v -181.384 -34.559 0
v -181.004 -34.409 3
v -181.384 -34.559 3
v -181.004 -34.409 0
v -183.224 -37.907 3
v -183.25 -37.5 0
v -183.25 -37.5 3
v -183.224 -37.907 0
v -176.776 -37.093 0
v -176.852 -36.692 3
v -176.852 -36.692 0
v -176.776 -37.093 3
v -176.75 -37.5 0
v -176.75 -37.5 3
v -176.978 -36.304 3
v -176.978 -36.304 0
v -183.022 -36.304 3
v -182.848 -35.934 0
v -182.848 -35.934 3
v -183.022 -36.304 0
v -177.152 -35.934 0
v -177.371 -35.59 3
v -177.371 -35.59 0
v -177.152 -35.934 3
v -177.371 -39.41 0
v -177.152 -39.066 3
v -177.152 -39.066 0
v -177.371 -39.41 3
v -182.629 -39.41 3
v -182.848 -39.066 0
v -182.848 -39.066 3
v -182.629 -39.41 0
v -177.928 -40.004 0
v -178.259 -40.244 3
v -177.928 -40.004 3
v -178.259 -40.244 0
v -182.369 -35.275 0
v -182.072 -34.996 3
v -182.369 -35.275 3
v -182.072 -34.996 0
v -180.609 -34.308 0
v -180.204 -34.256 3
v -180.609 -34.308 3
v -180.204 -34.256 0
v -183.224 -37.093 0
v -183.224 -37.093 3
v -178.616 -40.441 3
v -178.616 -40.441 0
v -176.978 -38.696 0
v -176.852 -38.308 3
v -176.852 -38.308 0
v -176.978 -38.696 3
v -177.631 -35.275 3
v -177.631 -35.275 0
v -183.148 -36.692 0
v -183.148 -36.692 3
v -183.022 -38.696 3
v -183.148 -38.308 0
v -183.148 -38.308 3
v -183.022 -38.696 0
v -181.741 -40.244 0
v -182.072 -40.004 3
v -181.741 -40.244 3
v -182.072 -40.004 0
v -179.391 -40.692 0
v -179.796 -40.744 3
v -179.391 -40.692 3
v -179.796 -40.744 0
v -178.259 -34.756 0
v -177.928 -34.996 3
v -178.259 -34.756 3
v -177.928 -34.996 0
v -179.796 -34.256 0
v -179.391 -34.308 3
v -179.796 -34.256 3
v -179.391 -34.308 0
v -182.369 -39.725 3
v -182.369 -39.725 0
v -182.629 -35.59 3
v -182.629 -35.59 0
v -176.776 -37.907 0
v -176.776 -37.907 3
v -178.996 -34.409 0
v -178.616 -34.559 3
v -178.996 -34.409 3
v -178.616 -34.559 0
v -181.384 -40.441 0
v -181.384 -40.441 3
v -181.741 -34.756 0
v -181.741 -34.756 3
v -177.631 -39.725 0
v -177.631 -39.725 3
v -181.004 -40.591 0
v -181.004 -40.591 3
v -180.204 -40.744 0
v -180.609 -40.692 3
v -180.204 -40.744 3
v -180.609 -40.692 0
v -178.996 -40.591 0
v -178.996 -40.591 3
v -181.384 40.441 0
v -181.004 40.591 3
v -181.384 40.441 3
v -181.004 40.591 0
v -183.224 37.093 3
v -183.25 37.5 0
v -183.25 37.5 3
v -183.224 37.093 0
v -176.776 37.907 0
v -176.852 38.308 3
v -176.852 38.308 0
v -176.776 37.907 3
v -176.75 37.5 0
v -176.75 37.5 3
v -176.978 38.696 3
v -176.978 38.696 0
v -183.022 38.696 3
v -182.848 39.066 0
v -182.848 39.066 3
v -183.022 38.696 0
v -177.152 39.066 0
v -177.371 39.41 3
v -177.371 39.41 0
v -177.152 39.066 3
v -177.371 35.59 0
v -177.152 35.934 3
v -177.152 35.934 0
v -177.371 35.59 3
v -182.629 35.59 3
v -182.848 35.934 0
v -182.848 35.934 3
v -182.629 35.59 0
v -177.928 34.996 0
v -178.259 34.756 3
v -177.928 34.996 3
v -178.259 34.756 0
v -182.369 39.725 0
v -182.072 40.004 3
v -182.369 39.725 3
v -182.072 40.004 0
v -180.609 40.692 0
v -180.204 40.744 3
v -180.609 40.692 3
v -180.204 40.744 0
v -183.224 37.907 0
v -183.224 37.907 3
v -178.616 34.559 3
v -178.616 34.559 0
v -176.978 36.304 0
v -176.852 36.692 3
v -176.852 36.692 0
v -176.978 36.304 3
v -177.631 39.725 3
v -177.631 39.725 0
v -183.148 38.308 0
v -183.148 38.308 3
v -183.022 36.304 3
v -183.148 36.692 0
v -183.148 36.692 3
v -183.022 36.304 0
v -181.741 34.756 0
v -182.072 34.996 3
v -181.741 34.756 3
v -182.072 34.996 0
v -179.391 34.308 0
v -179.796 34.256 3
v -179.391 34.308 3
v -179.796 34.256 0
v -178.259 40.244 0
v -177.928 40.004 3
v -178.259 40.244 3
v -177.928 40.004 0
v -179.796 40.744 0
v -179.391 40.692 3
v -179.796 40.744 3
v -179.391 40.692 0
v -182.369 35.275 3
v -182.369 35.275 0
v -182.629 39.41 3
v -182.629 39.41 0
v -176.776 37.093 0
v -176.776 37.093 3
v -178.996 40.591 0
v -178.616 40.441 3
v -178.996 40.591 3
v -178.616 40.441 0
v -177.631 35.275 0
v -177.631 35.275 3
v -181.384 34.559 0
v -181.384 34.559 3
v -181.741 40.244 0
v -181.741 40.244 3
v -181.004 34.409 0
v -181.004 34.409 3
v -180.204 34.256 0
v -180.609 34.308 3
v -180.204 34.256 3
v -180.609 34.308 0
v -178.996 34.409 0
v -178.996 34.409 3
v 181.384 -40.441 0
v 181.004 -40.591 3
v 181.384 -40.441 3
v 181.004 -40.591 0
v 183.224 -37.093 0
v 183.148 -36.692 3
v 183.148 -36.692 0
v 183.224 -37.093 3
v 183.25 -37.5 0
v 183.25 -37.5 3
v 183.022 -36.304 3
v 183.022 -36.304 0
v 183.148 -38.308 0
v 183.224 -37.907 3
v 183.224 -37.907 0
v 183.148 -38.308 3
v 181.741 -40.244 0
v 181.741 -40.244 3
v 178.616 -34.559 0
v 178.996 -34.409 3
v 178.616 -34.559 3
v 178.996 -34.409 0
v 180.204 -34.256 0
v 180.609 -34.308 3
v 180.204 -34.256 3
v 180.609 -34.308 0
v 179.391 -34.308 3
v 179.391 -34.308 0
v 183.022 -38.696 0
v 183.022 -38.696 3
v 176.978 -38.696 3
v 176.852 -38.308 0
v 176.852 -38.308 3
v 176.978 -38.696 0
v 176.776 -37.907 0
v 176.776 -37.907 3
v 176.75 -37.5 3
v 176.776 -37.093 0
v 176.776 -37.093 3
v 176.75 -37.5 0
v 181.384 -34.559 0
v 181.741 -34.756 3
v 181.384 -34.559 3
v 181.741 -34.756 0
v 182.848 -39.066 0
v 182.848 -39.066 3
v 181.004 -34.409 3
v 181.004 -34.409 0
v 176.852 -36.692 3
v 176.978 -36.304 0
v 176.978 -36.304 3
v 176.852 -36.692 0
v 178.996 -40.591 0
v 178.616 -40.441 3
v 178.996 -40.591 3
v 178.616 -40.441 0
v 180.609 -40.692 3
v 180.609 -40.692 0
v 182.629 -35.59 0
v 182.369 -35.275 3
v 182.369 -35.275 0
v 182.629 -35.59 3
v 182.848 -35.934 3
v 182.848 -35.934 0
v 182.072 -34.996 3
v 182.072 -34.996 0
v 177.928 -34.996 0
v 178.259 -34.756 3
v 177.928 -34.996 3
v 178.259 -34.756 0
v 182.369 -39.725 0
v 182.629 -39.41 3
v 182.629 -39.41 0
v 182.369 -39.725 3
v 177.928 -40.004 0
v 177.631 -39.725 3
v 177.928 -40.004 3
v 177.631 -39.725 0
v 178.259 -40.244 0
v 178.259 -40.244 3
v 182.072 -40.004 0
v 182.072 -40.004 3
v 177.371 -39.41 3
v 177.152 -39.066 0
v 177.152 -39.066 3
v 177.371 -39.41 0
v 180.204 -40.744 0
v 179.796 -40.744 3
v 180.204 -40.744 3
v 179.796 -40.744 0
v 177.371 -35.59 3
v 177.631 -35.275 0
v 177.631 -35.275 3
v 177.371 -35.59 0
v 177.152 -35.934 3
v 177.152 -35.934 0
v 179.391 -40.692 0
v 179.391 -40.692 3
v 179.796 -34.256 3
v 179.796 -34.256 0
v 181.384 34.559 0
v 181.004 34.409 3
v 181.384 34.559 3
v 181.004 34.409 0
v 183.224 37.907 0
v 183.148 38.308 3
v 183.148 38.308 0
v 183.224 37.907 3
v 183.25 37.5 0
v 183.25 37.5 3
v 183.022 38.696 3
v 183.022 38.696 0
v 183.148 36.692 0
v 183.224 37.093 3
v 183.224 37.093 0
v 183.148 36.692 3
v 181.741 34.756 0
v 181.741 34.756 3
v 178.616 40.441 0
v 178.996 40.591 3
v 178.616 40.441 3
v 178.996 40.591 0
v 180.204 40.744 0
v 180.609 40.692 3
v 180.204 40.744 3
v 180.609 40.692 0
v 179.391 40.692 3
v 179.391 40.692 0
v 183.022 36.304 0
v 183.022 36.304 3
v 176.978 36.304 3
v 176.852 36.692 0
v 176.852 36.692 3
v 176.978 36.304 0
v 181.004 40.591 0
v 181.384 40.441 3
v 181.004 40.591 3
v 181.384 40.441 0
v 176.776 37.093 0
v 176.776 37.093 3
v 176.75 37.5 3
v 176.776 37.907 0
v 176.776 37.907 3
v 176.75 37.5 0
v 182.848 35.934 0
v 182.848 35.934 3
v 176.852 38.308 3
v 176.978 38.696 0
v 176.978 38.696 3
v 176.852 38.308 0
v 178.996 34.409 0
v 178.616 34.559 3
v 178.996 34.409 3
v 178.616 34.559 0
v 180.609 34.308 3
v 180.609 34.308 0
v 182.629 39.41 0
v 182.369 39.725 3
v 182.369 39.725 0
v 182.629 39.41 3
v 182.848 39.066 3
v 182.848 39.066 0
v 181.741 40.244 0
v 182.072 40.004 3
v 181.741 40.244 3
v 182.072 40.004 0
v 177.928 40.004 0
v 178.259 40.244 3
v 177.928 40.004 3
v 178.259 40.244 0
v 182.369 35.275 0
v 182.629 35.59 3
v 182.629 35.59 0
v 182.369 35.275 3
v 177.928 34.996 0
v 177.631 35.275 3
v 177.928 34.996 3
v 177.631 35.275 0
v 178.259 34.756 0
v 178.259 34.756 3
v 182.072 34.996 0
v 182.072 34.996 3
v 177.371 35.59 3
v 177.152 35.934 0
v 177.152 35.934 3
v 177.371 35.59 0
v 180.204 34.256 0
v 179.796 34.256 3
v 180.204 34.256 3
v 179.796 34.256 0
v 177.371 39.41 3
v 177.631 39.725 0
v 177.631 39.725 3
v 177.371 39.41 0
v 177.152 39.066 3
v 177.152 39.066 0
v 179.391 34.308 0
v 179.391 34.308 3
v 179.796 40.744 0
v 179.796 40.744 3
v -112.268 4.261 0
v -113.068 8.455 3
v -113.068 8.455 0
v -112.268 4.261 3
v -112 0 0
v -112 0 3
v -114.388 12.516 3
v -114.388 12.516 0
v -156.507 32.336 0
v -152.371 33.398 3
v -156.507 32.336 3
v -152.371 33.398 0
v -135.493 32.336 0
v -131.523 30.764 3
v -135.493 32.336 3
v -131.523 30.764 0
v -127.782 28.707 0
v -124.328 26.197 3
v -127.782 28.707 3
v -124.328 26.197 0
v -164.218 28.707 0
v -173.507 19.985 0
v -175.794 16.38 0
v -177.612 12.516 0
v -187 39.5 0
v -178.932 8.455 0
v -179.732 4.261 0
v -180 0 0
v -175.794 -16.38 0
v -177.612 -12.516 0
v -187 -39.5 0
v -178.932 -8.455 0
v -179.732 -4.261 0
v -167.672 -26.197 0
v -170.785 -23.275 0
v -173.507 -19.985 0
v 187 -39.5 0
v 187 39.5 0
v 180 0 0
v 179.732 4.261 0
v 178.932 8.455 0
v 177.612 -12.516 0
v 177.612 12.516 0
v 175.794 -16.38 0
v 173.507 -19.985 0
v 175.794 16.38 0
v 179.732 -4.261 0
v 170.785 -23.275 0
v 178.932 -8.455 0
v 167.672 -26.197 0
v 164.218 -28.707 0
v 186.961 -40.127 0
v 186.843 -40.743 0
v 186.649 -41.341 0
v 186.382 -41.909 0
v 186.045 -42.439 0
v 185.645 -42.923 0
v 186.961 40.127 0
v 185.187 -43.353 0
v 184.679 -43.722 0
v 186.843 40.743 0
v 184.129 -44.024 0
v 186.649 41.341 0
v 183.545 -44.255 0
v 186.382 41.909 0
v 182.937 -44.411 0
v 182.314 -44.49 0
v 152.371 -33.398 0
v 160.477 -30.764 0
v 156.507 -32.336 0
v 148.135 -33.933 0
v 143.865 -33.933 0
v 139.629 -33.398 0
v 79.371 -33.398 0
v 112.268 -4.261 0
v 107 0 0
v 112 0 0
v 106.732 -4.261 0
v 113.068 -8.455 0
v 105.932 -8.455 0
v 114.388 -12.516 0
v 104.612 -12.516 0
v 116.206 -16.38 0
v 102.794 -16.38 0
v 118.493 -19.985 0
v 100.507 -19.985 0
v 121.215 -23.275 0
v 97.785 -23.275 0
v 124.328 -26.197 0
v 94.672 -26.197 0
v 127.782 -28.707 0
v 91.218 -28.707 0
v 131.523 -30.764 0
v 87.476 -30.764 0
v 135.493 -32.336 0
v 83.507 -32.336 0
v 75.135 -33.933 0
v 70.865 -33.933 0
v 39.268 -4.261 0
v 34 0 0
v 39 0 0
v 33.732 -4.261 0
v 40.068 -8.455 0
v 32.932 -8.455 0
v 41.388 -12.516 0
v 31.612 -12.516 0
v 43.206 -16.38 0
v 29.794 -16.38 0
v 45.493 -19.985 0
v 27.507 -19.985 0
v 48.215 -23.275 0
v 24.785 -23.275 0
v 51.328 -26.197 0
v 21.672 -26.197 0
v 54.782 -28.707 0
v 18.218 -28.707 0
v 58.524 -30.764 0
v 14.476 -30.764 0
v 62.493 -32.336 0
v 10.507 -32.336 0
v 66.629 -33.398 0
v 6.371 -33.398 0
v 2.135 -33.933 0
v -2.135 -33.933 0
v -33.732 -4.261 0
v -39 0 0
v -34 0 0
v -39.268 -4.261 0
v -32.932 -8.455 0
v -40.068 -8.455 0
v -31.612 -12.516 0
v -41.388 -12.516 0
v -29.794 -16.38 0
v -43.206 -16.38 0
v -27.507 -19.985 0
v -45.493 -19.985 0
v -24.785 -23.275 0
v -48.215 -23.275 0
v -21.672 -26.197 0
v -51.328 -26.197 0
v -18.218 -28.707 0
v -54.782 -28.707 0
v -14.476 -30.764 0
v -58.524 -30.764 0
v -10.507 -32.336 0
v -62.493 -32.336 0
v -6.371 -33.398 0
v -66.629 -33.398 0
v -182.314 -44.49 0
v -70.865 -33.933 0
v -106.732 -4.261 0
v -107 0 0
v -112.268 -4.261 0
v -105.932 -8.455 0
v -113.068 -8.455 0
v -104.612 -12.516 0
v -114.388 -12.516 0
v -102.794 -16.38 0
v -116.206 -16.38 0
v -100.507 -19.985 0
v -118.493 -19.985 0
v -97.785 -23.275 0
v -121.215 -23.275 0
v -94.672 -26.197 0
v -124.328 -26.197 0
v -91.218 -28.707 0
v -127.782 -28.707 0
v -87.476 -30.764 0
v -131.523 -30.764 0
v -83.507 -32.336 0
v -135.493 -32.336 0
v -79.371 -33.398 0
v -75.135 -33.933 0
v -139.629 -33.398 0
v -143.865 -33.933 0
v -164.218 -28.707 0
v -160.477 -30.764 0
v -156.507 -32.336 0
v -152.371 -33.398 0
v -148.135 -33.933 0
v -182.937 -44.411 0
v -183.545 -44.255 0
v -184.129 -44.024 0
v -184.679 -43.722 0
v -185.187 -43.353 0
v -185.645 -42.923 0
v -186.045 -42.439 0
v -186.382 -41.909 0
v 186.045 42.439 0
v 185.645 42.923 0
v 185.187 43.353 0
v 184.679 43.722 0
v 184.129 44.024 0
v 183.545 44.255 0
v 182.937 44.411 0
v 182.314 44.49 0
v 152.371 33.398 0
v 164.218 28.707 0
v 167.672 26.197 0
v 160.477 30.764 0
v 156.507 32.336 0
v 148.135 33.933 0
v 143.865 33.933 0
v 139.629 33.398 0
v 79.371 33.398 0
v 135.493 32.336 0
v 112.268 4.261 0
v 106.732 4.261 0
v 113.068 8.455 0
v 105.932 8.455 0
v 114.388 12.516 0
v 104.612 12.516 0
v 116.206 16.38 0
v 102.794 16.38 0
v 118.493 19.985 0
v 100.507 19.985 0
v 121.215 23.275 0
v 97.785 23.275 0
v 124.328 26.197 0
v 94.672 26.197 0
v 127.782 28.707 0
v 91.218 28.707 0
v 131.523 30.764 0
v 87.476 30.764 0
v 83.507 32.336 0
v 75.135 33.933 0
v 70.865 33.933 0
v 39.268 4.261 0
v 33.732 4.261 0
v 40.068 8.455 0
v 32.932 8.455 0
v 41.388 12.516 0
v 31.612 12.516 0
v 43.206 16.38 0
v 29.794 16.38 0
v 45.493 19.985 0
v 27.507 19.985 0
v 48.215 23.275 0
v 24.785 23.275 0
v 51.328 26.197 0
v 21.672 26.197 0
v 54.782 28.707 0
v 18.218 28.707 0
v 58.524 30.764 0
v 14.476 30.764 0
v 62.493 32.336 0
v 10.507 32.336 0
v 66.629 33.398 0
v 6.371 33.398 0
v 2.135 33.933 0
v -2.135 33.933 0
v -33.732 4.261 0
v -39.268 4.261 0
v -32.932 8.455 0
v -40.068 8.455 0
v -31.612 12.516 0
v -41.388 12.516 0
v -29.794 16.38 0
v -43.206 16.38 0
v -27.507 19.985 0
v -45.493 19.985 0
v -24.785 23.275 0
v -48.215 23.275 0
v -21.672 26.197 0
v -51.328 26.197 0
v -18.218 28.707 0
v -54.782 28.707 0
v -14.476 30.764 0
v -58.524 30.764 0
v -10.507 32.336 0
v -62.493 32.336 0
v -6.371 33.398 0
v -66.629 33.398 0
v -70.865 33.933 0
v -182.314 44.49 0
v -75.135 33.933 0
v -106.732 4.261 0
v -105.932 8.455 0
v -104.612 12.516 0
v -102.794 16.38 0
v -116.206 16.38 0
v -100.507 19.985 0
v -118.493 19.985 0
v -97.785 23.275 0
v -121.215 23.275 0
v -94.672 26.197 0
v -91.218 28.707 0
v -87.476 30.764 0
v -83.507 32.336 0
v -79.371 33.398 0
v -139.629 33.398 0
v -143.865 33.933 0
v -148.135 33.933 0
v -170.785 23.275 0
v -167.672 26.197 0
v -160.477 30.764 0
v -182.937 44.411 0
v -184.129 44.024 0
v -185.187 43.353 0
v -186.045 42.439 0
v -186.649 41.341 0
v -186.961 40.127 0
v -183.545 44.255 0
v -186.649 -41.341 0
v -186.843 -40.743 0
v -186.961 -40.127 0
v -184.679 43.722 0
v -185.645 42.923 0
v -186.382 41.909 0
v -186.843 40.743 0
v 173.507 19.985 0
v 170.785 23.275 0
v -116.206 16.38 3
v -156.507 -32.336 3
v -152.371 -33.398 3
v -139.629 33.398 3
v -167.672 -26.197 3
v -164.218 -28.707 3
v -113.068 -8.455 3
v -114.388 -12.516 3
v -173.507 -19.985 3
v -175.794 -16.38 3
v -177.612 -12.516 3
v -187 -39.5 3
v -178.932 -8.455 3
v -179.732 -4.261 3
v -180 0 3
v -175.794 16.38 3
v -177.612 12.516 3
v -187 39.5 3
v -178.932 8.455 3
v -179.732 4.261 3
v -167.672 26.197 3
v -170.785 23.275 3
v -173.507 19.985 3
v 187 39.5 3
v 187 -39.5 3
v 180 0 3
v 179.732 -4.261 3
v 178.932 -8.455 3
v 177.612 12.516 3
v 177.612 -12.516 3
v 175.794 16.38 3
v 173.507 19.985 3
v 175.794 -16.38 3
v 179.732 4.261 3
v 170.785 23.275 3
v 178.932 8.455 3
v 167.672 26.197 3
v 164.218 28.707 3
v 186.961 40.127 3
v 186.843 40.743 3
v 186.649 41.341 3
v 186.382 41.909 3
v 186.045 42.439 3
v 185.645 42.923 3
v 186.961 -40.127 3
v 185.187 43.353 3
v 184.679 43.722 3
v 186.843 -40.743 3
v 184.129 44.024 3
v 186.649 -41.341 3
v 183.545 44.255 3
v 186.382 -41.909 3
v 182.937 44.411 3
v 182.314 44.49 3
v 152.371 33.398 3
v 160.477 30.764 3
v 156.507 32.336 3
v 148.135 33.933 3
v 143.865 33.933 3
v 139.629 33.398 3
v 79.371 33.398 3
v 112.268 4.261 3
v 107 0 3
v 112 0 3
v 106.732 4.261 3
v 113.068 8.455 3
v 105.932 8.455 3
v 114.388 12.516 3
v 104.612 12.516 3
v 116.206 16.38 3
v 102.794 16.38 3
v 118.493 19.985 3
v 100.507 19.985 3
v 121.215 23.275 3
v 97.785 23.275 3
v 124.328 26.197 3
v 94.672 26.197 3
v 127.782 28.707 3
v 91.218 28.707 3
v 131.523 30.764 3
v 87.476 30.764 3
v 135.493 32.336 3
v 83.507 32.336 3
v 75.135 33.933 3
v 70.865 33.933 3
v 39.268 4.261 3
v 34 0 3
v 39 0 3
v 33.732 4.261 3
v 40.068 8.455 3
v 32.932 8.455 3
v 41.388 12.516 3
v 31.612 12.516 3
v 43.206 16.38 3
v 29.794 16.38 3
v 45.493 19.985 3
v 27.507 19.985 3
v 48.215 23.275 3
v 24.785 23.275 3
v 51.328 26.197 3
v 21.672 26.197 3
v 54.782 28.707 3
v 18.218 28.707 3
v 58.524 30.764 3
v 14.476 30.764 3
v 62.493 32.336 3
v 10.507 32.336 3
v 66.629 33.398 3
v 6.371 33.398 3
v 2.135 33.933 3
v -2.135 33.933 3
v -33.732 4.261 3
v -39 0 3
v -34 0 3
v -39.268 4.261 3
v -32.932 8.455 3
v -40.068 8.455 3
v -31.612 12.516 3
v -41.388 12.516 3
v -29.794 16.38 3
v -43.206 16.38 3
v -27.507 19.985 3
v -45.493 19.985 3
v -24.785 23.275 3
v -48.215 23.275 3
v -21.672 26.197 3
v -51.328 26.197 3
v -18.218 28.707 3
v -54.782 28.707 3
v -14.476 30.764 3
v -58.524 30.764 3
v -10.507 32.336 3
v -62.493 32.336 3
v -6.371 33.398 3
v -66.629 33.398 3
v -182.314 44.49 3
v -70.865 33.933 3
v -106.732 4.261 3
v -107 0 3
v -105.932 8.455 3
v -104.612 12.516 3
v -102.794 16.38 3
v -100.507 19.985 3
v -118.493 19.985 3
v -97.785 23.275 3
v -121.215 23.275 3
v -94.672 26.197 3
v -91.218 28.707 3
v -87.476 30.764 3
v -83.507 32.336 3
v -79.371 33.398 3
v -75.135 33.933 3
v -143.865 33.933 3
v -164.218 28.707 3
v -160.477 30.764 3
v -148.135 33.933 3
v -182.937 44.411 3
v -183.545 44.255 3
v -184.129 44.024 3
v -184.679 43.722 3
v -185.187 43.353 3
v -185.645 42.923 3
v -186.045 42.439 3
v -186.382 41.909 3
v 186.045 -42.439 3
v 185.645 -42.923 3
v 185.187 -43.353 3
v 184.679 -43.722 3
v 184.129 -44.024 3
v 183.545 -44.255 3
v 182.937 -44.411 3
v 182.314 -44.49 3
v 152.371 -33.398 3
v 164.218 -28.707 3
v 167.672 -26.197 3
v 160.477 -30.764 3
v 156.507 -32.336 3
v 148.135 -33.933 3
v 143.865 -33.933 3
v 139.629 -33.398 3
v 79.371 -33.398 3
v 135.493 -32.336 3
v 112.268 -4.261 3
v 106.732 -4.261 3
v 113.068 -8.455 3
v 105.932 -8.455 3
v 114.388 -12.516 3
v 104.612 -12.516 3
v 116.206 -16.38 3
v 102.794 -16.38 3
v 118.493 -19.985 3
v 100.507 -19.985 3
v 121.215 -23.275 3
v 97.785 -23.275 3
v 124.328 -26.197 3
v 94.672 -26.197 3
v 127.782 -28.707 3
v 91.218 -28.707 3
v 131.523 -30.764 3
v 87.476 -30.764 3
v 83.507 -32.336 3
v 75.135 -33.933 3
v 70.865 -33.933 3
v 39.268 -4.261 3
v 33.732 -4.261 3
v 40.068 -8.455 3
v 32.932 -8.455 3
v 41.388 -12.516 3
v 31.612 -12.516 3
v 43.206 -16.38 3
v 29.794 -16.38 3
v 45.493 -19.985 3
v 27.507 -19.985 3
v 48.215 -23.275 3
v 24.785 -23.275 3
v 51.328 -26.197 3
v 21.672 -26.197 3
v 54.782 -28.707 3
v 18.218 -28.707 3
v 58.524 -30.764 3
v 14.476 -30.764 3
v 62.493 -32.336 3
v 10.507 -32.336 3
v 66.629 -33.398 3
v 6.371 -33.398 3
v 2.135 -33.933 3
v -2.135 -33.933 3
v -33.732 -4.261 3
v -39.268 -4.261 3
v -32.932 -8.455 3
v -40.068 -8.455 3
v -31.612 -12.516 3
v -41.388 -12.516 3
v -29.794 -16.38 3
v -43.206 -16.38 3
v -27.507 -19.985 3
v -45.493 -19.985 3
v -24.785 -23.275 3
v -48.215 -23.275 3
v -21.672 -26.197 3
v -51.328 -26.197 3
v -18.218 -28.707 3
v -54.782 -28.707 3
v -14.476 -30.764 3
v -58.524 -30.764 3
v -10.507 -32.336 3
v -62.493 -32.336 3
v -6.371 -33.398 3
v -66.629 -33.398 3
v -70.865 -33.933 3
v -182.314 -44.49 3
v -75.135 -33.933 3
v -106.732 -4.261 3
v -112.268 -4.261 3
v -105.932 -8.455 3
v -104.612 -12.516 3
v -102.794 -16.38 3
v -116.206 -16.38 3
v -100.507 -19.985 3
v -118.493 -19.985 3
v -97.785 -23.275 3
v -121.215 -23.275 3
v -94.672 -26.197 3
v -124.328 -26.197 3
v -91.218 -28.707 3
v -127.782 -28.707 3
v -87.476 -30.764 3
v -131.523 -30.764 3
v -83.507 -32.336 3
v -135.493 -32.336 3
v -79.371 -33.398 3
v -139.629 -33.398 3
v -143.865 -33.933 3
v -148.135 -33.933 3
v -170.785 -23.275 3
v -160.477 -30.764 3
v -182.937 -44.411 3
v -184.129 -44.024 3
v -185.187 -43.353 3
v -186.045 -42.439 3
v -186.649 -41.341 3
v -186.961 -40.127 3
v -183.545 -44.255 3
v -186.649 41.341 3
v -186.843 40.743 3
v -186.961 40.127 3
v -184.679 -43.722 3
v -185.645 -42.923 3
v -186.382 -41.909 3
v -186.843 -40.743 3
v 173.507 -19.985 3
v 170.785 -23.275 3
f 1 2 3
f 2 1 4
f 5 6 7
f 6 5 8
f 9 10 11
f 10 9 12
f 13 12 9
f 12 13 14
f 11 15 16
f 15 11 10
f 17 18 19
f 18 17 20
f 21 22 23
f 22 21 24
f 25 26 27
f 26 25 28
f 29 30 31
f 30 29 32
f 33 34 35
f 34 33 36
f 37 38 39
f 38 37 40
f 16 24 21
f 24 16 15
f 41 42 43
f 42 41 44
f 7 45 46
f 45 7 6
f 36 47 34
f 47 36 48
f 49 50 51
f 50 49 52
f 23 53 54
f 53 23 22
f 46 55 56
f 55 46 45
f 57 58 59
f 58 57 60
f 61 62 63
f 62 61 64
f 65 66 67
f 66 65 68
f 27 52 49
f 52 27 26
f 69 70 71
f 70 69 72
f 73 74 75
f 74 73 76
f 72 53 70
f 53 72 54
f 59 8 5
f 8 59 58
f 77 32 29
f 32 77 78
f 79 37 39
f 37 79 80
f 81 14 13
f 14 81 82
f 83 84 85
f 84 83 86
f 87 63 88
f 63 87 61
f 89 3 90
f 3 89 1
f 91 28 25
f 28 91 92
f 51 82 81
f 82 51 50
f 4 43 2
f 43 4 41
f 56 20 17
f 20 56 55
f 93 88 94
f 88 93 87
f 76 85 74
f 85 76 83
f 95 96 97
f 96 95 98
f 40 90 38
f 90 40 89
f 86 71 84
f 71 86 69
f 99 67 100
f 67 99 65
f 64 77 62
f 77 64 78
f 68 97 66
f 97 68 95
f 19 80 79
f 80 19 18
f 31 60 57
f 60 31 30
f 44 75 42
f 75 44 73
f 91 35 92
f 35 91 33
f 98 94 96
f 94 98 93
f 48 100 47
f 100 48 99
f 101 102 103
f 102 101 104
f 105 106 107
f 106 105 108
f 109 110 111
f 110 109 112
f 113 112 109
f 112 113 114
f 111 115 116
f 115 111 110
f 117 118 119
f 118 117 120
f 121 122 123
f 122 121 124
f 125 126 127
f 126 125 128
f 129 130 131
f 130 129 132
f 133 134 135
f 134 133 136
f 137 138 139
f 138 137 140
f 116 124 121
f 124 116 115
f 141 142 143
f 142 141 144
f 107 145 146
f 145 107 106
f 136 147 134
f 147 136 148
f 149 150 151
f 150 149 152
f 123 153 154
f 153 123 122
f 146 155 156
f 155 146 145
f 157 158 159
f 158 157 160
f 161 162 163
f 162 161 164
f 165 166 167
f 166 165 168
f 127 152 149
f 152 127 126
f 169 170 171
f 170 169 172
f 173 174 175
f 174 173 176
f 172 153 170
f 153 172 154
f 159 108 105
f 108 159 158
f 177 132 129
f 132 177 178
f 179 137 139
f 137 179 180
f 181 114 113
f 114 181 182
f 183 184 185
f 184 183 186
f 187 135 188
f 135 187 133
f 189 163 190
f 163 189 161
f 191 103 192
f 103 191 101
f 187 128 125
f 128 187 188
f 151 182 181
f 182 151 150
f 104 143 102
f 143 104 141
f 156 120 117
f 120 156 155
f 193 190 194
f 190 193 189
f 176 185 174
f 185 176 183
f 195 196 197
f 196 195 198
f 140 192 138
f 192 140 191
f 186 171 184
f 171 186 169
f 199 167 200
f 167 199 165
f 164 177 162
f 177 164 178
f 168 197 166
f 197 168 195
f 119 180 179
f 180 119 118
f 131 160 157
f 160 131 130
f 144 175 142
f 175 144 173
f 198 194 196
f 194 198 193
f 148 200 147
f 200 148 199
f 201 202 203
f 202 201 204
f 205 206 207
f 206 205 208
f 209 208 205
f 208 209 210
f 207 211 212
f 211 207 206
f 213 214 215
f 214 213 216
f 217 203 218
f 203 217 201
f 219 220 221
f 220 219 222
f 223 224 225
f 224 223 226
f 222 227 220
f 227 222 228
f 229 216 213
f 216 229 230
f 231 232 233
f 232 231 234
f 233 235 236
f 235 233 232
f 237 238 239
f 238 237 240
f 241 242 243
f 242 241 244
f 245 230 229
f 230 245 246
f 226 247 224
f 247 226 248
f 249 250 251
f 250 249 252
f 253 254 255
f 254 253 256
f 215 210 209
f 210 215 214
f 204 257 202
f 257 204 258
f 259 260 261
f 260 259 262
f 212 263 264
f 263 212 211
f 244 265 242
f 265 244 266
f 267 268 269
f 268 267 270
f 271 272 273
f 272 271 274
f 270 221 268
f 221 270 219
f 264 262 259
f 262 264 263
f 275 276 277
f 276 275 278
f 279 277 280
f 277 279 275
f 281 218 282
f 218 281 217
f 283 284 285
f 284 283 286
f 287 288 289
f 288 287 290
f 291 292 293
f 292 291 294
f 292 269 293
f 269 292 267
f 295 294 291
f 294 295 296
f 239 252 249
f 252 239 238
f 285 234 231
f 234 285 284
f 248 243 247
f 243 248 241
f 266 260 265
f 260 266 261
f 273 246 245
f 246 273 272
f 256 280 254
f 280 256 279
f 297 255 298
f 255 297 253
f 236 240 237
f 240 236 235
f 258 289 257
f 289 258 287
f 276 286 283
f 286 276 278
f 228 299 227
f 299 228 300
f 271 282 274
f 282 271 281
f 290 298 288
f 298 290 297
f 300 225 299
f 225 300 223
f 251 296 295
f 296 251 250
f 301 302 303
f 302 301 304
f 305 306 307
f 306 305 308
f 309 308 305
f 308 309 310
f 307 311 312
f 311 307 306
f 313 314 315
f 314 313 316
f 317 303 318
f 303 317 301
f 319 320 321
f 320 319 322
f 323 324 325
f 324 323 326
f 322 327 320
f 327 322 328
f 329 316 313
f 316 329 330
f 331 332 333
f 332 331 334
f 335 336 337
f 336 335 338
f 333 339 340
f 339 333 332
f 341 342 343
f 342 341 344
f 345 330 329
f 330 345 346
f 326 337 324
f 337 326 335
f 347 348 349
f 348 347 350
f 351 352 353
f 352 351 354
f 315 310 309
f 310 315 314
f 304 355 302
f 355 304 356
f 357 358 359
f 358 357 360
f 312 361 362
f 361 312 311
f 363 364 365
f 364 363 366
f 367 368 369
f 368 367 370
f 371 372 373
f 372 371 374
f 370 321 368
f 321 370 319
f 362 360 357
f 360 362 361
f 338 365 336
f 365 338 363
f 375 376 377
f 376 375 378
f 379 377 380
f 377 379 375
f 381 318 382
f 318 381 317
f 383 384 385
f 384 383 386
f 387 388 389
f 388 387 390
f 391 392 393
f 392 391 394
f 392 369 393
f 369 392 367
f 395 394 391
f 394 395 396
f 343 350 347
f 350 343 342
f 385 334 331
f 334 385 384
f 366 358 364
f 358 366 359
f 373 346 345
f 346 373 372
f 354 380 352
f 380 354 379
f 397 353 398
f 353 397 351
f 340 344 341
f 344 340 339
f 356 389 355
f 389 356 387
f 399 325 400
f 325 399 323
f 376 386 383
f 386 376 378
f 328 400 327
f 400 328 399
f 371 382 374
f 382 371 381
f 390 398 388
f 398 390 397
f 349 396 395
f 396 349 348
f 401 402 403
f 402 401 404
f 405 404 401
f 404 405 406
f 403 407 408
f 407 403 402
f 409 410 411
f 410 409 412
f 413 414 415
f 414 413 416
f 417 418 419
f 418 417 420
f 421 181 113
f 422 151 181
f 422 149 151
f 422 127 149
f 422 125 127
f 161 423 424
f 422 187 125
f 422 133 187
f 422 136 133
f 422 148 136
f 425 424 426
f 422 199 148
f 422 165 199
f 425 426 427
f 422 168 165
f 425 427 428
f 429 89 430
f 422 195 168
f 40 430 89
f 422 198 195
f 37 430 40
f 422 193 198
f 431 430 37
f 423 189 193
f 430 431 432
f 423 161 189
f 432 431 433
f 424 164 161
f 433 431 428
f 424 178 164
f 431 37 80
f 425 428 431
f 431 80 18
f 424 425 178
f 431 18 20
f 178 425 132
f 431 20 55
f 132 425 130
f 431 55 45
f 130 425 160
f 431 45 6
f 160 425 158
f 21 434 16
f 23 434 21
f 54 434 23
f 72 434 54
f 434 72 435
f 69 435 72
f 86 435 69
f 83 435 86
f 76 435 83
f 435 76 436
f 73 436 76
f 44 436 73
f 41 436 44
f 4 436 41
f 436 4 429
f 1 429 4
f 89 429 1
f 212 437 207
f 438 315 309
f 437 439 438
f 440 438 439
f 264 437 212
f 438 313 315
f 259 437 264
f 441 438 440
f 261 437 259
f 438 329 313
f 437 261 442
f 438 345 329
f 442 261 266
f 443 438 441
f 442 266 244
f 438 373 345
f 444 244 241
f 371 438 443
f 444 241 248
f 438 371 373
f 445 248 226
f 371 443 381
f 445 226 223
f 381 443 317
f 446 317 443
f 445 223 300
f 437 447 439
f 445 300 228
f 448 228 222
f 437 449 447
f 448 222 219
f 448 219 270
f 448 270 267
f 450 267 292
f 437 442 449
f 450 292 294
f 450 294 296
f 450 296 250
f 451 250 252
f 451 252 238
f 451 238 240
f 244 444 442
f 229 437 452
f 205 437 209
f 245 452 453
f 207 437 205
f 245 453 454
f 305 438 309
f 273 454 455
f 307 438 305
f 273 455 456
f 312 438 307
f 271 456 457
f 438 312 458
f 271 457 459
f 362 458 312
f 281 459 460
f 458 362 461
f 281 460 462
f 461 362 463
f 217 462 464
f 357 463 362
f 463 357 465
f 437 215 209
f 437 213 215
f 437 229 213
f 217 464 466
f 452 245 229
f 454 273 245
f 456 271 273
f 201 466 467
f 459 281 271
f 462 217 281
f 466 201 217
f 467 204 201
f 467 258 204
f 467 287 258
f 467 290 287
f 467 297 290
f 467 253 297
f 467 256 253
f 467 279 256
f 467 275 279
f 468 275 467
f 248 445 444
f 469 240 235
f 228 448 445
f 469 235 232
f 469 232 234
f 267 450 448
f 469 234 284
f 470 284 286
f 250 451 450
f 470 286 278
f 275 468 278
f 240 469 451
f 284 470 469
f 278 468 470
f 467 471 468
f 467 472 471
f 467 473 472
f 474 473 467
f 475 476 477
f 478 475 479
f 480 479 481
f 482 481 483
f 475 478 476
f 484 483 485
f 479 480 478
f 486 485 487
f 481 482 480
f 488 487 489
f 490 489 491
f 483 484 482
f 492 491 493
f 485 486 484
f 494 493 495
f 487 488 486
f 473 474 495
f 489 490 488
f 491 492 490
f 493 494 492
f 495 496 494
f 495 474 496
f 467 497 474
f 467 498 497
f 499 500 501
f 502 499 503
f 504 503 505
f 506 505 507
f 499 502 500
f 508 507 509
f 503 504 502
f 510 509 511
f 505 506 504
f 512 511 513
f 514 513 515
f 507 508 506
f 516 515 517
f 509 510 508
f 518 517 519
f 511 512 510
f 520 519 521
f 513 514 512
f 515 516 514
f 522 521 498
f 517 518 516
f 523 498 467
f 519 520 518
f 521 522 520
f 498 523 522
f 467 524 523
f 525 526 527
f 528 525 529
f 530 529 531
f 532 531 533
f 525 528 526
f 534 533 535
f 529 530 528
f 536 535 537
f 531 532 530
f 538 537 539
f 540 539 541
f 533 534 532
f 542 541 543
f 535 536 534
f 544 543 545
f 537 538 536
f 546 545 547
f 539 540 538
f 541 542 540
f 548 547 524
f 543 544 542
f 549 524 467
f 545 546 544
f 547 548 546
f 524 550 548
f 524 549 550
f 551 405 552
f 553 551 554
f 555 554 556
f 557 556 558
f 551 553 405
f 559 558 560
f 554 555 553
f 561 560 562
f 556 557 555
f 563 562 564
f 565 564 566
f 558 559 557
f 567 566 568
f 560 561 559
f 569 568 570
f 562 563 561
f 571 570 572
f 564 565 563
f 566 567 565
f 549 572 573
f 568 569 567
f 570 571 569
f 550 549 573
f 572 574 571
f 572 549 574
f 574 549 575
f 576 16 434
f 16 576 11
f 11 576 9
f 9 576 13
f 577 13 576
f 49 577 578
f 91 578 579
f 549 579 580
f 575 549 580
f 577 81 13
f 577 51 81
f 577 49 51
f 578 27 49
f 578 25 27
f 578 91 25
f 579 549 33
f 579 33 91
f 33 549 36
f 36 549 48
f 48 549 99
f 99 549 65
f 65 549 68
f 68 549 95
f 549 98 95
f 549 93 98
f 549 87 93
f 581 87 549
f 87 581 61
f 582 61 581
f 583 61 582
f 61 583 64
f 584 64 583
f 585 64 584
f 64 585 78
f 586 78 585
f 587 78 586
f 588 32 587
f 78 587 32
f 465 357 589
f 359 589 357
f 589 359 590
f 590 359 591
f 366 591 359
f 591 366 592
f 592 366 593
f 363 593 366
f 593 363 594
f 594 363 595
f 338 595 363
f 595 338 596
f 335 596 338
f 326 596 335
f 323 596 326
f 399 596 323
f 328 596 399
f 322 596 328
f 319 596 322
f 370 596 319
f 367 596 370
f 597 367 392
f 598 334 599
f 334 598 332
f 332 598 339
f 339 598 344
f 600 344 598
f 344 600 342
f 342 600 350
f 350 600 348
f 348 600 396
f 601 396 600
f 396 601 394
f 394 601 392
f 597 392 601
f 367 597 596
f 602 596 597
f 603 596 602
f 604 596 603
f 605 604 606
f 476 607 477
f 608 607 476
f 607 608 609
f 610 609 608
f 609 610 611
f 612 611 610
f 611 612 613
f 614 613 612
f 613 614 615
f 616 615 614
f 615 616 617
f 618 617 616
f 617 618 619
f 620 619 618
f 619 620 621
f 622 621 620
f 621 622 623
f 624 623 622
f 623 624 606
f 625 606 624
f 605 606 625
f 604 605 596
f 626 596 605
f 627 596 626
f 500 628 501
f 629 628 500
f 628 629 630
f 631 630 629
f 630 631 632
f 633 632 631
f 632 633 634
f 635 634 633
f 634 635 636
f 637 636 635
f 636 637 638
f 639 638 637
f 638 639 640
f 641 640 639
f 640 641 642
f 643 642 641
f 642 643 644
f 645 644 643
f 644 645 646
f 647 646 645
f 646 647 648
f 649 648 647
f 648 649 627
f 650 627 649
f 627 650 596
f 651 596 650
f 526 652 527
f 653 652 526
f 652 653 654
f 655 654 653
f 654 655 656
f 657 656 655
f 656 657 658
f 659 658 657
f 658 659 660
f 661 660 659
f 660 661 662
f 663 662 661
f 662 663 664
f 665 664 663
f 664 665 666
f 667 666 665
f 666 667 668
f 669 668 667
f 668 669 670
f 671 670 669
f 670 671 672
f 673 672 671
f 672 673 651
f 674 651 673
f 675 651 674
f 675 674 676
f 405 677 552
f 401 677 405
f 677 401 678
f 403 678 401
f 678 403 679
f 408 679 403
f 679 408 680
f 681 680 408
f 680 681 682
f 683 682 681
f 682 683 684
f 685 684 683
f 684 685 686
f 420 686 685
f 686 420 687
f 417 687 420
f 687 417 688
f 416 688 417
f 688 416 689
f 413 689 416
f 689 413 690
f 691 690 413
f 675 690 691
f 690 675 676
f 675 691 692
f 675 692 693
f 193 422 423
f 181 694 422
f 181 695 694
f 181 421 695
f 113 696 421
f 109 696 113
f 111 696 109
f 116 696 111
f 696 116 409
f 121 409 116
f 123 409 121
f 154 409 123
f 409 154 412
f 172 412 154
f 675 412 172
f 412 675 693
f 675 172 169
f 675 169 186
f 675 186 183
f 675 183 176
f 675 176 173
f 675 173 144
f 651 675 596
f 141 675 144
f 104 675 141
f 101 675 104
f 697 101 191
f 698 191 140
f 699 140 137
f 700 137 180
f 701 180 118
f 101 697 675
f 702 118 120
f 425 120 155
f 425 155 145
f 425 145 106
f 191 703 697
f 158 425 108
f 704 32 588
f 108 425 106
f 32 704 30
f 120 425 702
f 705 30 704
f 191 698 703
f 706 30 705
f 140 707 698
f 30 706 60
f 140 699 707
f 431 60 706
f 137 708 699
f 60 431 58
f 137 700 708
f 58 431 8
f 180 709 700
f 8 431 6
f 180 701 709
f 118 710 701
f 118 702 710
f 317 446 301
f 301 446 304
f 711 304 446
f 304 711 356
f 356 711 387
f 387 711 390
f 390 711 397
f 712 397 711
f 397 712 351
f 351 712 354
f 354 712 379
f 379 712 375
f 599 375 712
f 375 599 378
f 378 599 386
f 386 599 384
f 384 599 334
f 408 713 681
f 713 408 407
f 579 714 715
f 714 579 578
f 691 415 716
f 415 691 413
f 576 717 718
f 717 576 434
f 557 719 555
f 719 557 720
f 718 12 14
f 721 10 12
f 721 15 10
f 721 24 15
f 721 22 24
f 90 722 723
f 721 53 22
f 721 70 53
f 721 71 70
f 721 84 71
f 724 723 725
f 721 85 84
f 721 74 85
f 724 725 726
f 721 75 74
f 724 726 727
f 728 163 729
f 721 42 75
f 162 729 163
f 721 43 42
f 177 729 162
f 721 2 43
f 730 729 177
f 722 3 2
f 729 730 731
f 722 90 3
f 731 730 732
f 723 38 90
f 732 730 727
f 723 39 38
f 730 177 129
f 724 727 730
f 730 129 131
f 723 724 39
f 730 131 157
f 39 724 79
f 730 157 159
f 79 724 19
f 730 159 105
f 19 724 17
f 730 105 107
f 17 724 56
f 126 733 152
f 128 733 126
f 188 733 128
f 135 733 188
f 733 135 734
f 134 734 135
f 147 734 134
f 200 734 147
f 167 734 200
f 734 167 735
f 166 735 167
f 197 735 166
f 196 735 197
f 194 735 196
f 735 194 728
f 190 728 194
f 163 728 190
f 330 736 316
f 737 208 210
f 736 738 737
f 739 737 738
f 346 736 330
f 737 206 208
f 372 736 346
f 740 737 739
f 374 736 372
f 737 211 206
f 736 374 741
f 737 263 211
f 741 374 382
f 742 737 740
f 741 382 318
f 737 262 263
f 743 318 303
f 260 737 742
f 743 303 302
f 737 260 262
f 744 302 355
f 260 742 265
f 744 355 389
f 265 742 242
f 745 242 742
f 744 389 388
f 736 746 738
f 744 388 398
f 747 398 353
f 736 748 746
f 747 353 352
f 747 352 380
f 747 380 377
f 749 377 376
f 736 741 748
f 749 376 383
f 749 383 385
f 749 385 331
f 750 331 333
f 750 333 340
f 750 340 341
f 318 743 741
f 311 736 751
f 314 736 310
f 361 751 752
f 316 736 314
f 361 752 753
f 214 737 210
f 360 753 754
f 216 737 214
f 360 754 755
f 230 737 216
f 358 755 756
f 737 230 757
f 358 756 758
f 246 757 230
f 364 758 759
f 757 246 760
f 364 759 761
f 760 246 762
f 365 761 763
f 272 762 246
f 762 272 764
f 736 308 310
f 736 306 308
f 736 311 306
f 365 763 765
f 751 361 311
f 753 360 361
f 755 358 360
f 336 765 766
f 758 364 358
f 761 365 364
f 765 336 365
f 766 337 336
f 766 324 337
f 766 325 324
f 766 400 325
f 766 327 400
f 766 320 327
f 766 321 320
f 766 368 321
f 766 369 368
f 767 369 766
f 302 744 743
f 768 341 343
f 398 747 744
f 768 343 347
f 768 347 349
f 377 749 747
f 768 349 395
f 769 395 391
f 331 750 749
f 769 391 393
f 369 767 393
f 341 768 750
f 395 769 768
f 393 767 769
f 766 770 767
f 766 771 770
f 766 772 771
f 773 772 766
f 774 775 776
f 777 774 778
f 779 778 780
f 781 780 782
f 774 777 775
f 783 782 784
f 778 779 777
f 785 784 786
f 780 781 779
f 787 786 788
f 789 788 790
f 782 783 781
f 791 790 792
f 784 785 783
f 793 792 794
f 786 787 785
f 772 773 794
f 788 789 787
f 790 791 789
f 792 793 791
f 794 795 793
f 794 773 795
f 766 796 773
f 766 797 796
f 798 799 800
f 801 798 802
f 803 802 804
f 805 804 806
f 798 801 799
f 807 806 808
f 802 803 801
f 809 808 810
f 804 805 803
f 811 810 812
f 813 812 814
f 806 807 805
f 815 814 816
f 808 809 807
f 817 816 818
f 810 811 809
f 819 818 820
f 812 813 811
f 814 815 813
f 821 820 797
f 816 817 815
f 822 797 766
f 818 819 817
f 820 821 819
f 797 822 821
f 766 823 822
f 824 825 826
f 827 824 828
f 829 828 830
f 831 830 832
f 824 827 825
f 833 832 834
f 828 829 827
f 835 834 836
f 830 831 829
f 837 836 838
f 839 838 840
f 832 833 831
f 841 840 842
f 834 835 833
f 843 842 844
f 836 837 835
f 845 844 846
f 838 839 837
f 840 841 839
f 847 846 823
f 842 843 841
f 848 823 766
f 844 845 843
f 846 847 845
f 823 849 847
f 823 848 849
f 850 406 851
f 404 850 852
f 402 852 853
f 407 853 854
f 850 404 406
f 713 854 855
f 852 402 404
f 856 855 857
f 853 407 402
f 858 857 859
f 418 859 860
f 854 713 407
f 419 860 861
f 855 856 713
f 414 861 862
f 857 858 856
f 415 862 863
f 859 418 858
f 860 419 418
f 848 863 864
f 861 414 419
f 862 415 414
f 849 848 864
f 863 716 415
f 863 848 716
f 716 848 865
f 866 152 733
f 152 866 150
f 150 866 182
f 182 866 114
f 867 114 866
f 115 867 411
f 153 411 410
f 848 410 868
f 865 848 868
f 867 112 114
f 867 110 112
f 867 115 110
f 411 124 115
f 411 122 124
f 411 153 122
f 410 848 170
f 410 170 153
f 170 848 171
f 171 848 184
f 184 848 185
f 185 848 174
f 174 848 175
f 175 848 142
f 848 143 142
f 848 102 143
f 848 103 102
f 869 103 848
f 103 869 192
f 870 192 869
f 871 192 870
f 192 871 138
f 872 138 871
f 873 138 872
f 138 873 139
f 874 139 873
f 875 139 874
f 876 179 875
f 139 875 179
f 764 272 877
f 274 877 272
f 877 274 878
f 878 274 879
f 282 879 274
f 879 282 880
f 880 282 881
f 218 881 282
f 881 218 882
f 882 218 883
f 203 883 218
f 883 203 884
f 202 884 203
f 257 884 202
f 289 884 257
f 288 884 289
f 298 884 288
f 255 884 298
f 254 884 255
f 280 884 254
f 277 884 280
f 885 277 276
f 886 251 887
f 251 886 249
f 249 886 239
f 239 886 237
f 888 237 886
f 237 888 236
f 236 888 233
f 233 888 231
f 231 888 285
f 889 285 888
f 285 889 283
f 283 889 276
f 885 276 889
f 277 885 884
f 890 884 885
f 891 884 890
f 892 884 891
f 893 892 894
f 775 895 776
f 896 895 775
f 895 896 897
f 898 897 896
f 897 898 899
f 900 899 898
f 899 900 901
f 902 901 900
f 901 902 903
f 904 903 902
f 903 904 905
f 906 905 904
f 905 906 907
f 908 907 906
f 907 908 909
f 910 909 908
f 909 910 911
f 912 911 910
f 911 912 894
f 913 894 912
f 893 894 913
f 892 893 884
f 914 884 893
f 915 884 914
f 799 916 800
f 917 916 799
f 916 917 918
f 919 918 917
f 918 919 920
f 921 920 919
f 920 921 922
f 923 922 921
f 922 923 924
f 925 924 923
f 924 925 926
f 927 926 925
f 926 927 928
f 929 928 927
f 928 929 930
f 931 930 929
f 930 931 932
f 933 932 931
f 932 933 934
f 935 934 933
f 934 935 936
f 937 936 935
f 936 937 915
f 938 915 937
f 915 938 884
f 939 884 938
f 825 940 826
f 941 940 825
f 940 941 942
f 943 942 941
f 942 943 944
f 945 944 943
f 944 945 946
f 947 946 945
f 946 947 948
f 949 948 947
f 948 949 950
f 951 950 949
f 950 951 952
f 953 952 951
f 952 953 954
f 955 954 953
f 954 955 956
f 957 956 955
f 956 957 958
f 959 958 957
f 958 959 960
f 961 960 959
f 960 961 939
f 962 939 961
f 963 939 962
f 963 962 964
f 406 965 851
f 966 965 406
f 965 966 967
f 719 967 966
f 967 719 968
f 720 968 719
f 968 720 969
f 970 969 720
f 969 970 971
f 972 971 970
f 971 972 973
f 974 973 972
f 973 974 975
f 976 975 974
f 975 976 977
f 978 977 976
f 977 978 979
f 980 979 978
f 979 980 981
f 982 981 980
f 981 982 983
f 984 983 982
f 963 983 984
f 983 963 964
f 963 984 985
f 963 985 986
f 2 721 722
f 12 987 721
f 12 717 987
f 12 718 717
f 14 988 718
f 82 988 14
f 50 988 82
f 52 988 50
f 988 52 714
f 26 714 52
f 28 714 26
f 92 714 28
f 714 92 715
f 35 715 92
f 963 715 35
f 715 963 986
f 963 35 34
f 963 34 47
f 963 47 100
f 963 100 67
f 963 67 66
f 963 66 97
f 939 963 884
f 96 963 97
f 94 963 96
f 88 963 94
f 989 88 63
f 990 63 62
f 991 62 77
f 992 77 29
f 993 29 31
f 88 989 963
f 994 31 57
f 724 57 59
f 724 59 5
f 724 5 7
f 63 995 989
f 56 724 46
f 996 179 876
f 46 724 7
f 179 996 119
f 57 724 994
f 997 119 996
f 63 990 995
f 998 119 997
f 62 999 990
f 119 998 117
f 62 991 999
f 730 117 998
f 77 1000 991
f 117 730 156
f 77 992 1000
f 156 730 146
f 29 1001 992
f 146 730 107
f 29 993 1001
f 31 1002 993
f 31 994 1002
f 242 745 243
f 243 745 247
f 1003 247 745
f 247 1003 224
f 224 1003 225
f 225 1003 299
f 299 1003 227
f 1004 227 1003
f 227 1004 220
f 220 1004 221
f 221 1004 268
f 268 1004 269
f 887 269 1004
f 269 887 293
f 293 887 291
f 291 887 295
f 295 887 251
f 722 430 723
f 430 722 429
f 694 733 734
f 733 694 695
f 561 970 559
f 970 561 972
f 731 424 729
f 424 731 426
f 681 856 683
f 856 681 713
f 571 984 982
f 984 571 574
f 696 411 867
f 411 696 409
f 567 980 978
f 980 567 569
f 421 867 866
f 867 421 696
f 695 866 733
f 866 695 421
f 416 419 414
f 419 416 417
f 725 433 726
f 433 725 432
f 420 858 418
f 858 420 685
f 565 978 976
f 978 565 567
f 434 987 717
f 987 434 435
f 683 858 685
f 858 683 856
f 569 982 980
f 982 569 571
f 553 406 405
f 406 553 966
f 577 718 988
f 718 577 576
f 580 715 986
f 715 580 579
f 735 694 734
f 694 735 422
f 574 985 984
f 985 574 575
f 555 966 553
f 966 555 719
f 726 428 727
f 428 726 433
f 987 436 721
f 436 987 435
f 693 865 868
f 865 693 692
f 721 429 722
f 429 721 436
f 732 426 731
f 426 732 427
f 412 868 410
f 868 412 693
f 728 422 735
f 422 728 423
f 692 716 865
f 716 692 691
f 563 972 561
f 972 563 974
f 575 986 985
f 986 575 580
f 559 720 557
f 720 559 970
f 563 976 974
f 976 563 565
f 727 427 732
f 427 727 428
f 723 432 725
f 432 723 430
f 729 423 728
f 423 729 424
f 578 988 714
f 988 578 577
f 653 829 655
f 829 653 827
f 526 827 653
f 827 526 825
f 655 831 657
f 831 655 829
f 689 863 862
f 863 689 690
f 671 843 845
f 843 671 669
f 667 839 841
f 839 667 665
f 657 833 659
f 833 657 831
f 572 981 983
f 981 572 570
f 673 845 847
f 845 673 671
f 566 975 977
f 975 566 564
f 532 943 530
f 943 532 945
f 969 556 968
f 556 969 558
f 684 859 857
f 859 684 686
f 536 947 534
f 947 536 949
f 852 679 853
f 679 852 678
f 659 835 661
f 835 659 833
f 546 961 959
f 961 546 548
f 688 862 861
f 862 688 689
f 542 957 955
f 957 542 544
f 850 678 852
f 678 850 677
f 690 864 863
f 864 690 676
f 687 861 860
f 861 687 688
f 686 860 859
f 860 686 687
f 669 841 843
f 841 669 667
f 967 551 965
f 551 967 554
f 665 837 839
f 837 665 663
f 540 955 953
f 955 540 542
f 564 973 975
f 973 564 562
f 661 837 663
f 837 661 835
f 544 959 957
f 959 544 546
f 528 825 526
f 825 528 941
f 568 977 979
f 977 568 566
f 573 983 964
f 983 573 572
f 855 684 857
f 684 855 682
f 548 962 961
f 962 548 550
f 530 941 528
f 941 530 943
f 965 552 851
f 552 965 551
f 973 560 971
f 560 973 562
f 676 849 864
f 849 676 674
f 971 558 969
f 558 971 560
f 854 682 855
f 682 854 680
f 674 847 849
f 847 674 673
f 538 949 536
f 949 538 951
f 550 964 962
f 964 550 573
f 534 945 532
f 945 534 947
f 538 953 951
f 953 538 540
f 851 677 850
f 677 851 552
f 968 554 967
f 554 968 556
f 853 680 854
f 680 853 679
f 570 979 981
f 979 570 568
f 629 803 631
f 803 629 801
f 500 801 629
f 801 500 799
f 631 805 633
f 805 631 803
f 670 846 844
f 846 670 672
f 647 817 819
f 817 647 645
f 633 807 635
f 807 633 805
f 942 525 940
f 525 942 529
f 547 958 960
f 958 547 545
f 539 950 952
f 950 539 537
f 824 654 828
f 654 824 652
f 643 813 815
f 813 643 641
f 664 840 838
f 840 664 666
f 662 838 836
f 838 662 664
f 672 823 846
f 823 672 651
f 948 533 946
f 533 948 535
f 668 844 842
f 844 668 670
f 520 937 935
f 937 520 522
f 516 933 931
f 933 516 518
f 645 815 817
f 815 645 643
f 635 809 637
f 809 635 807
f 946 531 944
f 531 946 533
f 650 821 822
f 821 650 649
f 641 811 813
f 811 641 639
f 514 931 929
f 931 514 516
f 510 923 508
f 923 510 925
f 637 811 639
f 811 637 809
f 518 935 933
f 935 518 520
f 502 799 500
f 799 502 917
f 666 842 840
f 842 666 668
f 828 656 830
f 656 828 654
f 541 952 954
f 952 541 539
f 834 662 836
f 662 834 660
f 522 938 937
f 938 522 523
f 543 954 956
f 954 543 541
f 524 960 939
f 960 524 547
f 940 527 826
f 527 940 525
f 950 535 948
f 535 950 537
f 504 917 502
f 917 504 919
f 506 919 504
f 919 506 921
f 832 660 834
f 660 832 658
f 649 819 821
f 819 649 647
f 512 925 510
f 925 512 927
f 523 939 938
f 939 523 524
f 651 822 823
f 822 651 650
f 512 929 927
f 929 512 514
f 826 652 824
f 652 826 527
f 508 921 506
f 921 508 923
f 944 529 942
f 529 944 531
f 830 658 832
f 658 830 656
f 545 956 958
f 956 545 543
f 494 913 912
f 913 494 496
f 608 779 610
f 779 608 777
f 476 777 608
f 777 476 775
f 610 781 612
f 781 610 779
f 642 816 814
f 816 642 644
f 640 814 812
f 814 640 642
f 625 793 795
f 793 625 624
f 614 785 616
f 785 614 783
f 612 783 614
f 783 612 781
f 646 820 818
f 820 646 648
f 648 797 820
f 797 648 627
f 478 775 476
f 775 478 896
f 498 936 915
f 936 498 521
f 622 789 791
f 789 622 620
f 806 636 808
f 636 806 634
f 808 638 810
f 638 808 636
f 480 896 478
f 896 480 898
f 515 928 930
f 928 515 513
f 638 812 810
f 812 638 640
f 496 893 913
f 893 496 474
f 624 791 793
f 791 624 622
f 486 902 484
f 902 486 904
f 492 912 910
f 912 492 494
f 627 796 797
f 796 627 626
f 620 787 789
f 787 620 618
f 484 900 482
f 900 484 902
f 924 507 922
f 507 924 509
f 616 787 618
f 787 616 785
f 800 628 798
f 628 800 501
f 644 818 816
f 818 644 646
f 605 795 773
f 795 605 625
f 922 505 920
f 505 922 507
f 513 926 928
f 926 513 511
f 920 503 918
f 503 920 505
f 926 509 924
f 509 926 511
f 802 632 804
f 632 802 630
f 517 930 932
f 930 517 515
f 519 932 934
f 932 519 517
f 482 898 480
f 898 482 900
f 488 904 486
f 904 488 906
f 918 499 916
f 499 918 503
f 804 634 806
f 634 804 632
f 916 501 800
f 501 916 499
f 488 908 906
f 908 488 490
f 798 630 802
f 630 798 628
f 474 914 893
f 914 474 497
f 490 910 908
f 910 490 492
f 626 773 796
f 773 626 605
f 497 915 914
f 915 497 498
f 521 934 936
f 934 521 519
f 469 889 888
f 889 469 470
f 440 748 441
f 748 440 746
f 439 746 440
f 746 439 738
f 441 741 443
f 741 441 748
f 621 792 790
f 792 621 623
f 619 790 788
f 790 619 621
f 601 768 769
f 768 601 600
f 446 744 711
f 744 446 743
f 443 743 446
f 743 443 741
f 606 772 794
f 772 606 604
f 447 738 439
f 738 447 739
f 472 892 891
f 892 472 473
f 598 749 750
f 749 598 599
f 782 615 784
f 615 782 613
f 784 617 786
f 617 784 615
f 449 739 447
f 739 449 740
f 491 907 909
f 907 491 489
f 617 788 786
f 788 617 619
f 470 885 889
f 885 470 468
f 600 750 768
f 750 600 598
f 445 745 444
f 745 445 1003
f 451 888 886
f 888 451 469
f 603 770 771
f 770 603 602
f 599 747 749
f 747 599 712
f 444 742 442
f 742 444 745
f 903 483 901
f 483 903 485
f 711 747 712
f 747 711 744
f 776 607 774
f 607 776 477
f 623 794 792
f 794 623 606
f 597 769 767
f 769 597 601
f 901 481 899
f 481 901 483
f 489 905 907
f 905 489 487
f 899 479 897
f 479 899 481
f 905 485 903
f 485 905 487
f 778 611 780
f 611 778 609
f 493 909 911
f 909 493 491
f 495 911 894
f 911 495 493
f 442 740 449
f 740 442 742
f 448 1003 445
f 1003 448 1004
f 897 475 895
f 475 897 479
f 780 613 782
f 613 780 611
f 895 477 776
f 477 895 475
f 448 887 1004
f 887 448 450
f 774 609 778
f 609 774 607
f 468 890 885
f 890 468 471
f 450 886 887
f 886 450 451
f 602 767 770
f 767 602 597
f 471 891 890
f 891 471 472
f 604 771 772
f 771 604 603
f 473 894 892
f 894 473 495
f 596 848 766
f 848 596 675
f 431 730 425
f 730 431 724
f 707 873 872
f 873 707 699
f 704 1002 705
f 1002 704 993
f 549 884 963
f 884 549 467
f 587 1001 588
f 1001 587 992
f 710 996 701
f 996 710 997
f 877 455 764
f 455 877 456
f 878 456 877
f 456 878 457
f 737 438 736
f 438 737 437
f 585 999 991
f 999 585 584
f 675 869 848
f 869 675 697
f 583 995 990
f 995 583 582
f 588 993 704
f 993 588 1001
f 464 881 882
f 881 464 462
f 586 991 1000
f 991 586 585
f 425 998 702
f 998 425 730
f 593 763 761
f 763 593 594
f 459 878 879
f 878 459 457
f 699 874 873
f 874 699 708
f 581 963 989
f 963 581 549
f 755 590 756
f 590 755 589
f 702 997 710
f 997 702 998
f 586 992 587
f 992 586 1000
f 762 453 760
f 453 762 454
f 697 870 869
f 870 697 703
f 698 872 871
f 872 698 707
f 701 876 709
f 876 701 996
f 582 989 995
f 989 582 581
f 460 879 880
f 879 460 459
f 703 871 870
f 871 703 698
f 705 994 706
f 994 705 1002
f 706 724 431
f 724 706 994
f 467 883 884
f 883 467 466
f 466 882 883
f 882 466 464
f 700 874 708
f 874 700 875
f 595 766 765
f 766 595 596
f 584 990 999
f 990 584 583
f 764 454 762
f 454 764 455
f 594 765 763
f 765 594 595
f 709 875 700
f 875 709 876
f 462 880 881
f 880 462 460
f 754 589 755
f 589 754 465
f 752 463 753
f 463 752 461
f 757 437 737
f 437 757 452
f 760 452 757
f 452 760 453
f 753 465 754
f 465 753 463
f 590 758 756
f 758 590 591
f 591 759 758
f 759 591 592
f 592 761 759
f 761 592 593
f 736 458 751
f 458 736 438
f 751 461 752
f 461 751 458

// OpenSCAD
$fn = 50;


difference() {
	union() {
		hull() {
			translate(v = [-182.0000000000, 39.5000000000, 0]) {
				cylinder(h = 3, r = 5);
			}
			translate(v = [182.0000000000, 39.5000000000, 0]) {
				cylinder(h = 3, r = 5);
			}
			translate(v = [-182.0000000000, -39.5000000000, 0]) {
				cylinder(h = 3, r = 5);
			}
			translate(v = [182.0000000000, -39.5000000000, 0]) {
				cylinder(h = 3, r = 5);
			}
		}
	}
	union() {
		#translate(v = [-180.0000000000, -37.5000000000, -100.0000000000]) {
			cylinder(h = 200, r = 3.2500000000);
		}
		#translate(v = [-180.0000000000, 37.5000000000, -100.0000000000]) {
			cylinder(h = 200, r = 3.2500000000);
		}
		#translate(v = [180.0000000000, -37.5000000000, -100.0000000000]) {
			cylinder(h = 200, r = 3.2500000000);
		}
		#translate(v = [180.0000000000, 37.5000000000, -100.0000000000]) {
			cylinder(h = 200, r = 3.2500000000);
		}
		#translate(v = [-146.0000000000, 0, 0]) {
			cylinder(h = 3, r = 34.0000000000);
		}
		#translate(v = [-73.0000000000, 0, 0]) {
			cylinder(h = 3, r = 34.0000000000);
		}
		#cylinder(h = 3, r = 34.0000000000);
		#translate(v = [73.0000000000, 0, 0]) {
			cylinder(h = 3, r = 34.0000000000);
		}
		#translate(v = [146.0000000000, 0, 0]) {
			cylinder(h = 3, r = 34.0000000000);
		}
	}
}
